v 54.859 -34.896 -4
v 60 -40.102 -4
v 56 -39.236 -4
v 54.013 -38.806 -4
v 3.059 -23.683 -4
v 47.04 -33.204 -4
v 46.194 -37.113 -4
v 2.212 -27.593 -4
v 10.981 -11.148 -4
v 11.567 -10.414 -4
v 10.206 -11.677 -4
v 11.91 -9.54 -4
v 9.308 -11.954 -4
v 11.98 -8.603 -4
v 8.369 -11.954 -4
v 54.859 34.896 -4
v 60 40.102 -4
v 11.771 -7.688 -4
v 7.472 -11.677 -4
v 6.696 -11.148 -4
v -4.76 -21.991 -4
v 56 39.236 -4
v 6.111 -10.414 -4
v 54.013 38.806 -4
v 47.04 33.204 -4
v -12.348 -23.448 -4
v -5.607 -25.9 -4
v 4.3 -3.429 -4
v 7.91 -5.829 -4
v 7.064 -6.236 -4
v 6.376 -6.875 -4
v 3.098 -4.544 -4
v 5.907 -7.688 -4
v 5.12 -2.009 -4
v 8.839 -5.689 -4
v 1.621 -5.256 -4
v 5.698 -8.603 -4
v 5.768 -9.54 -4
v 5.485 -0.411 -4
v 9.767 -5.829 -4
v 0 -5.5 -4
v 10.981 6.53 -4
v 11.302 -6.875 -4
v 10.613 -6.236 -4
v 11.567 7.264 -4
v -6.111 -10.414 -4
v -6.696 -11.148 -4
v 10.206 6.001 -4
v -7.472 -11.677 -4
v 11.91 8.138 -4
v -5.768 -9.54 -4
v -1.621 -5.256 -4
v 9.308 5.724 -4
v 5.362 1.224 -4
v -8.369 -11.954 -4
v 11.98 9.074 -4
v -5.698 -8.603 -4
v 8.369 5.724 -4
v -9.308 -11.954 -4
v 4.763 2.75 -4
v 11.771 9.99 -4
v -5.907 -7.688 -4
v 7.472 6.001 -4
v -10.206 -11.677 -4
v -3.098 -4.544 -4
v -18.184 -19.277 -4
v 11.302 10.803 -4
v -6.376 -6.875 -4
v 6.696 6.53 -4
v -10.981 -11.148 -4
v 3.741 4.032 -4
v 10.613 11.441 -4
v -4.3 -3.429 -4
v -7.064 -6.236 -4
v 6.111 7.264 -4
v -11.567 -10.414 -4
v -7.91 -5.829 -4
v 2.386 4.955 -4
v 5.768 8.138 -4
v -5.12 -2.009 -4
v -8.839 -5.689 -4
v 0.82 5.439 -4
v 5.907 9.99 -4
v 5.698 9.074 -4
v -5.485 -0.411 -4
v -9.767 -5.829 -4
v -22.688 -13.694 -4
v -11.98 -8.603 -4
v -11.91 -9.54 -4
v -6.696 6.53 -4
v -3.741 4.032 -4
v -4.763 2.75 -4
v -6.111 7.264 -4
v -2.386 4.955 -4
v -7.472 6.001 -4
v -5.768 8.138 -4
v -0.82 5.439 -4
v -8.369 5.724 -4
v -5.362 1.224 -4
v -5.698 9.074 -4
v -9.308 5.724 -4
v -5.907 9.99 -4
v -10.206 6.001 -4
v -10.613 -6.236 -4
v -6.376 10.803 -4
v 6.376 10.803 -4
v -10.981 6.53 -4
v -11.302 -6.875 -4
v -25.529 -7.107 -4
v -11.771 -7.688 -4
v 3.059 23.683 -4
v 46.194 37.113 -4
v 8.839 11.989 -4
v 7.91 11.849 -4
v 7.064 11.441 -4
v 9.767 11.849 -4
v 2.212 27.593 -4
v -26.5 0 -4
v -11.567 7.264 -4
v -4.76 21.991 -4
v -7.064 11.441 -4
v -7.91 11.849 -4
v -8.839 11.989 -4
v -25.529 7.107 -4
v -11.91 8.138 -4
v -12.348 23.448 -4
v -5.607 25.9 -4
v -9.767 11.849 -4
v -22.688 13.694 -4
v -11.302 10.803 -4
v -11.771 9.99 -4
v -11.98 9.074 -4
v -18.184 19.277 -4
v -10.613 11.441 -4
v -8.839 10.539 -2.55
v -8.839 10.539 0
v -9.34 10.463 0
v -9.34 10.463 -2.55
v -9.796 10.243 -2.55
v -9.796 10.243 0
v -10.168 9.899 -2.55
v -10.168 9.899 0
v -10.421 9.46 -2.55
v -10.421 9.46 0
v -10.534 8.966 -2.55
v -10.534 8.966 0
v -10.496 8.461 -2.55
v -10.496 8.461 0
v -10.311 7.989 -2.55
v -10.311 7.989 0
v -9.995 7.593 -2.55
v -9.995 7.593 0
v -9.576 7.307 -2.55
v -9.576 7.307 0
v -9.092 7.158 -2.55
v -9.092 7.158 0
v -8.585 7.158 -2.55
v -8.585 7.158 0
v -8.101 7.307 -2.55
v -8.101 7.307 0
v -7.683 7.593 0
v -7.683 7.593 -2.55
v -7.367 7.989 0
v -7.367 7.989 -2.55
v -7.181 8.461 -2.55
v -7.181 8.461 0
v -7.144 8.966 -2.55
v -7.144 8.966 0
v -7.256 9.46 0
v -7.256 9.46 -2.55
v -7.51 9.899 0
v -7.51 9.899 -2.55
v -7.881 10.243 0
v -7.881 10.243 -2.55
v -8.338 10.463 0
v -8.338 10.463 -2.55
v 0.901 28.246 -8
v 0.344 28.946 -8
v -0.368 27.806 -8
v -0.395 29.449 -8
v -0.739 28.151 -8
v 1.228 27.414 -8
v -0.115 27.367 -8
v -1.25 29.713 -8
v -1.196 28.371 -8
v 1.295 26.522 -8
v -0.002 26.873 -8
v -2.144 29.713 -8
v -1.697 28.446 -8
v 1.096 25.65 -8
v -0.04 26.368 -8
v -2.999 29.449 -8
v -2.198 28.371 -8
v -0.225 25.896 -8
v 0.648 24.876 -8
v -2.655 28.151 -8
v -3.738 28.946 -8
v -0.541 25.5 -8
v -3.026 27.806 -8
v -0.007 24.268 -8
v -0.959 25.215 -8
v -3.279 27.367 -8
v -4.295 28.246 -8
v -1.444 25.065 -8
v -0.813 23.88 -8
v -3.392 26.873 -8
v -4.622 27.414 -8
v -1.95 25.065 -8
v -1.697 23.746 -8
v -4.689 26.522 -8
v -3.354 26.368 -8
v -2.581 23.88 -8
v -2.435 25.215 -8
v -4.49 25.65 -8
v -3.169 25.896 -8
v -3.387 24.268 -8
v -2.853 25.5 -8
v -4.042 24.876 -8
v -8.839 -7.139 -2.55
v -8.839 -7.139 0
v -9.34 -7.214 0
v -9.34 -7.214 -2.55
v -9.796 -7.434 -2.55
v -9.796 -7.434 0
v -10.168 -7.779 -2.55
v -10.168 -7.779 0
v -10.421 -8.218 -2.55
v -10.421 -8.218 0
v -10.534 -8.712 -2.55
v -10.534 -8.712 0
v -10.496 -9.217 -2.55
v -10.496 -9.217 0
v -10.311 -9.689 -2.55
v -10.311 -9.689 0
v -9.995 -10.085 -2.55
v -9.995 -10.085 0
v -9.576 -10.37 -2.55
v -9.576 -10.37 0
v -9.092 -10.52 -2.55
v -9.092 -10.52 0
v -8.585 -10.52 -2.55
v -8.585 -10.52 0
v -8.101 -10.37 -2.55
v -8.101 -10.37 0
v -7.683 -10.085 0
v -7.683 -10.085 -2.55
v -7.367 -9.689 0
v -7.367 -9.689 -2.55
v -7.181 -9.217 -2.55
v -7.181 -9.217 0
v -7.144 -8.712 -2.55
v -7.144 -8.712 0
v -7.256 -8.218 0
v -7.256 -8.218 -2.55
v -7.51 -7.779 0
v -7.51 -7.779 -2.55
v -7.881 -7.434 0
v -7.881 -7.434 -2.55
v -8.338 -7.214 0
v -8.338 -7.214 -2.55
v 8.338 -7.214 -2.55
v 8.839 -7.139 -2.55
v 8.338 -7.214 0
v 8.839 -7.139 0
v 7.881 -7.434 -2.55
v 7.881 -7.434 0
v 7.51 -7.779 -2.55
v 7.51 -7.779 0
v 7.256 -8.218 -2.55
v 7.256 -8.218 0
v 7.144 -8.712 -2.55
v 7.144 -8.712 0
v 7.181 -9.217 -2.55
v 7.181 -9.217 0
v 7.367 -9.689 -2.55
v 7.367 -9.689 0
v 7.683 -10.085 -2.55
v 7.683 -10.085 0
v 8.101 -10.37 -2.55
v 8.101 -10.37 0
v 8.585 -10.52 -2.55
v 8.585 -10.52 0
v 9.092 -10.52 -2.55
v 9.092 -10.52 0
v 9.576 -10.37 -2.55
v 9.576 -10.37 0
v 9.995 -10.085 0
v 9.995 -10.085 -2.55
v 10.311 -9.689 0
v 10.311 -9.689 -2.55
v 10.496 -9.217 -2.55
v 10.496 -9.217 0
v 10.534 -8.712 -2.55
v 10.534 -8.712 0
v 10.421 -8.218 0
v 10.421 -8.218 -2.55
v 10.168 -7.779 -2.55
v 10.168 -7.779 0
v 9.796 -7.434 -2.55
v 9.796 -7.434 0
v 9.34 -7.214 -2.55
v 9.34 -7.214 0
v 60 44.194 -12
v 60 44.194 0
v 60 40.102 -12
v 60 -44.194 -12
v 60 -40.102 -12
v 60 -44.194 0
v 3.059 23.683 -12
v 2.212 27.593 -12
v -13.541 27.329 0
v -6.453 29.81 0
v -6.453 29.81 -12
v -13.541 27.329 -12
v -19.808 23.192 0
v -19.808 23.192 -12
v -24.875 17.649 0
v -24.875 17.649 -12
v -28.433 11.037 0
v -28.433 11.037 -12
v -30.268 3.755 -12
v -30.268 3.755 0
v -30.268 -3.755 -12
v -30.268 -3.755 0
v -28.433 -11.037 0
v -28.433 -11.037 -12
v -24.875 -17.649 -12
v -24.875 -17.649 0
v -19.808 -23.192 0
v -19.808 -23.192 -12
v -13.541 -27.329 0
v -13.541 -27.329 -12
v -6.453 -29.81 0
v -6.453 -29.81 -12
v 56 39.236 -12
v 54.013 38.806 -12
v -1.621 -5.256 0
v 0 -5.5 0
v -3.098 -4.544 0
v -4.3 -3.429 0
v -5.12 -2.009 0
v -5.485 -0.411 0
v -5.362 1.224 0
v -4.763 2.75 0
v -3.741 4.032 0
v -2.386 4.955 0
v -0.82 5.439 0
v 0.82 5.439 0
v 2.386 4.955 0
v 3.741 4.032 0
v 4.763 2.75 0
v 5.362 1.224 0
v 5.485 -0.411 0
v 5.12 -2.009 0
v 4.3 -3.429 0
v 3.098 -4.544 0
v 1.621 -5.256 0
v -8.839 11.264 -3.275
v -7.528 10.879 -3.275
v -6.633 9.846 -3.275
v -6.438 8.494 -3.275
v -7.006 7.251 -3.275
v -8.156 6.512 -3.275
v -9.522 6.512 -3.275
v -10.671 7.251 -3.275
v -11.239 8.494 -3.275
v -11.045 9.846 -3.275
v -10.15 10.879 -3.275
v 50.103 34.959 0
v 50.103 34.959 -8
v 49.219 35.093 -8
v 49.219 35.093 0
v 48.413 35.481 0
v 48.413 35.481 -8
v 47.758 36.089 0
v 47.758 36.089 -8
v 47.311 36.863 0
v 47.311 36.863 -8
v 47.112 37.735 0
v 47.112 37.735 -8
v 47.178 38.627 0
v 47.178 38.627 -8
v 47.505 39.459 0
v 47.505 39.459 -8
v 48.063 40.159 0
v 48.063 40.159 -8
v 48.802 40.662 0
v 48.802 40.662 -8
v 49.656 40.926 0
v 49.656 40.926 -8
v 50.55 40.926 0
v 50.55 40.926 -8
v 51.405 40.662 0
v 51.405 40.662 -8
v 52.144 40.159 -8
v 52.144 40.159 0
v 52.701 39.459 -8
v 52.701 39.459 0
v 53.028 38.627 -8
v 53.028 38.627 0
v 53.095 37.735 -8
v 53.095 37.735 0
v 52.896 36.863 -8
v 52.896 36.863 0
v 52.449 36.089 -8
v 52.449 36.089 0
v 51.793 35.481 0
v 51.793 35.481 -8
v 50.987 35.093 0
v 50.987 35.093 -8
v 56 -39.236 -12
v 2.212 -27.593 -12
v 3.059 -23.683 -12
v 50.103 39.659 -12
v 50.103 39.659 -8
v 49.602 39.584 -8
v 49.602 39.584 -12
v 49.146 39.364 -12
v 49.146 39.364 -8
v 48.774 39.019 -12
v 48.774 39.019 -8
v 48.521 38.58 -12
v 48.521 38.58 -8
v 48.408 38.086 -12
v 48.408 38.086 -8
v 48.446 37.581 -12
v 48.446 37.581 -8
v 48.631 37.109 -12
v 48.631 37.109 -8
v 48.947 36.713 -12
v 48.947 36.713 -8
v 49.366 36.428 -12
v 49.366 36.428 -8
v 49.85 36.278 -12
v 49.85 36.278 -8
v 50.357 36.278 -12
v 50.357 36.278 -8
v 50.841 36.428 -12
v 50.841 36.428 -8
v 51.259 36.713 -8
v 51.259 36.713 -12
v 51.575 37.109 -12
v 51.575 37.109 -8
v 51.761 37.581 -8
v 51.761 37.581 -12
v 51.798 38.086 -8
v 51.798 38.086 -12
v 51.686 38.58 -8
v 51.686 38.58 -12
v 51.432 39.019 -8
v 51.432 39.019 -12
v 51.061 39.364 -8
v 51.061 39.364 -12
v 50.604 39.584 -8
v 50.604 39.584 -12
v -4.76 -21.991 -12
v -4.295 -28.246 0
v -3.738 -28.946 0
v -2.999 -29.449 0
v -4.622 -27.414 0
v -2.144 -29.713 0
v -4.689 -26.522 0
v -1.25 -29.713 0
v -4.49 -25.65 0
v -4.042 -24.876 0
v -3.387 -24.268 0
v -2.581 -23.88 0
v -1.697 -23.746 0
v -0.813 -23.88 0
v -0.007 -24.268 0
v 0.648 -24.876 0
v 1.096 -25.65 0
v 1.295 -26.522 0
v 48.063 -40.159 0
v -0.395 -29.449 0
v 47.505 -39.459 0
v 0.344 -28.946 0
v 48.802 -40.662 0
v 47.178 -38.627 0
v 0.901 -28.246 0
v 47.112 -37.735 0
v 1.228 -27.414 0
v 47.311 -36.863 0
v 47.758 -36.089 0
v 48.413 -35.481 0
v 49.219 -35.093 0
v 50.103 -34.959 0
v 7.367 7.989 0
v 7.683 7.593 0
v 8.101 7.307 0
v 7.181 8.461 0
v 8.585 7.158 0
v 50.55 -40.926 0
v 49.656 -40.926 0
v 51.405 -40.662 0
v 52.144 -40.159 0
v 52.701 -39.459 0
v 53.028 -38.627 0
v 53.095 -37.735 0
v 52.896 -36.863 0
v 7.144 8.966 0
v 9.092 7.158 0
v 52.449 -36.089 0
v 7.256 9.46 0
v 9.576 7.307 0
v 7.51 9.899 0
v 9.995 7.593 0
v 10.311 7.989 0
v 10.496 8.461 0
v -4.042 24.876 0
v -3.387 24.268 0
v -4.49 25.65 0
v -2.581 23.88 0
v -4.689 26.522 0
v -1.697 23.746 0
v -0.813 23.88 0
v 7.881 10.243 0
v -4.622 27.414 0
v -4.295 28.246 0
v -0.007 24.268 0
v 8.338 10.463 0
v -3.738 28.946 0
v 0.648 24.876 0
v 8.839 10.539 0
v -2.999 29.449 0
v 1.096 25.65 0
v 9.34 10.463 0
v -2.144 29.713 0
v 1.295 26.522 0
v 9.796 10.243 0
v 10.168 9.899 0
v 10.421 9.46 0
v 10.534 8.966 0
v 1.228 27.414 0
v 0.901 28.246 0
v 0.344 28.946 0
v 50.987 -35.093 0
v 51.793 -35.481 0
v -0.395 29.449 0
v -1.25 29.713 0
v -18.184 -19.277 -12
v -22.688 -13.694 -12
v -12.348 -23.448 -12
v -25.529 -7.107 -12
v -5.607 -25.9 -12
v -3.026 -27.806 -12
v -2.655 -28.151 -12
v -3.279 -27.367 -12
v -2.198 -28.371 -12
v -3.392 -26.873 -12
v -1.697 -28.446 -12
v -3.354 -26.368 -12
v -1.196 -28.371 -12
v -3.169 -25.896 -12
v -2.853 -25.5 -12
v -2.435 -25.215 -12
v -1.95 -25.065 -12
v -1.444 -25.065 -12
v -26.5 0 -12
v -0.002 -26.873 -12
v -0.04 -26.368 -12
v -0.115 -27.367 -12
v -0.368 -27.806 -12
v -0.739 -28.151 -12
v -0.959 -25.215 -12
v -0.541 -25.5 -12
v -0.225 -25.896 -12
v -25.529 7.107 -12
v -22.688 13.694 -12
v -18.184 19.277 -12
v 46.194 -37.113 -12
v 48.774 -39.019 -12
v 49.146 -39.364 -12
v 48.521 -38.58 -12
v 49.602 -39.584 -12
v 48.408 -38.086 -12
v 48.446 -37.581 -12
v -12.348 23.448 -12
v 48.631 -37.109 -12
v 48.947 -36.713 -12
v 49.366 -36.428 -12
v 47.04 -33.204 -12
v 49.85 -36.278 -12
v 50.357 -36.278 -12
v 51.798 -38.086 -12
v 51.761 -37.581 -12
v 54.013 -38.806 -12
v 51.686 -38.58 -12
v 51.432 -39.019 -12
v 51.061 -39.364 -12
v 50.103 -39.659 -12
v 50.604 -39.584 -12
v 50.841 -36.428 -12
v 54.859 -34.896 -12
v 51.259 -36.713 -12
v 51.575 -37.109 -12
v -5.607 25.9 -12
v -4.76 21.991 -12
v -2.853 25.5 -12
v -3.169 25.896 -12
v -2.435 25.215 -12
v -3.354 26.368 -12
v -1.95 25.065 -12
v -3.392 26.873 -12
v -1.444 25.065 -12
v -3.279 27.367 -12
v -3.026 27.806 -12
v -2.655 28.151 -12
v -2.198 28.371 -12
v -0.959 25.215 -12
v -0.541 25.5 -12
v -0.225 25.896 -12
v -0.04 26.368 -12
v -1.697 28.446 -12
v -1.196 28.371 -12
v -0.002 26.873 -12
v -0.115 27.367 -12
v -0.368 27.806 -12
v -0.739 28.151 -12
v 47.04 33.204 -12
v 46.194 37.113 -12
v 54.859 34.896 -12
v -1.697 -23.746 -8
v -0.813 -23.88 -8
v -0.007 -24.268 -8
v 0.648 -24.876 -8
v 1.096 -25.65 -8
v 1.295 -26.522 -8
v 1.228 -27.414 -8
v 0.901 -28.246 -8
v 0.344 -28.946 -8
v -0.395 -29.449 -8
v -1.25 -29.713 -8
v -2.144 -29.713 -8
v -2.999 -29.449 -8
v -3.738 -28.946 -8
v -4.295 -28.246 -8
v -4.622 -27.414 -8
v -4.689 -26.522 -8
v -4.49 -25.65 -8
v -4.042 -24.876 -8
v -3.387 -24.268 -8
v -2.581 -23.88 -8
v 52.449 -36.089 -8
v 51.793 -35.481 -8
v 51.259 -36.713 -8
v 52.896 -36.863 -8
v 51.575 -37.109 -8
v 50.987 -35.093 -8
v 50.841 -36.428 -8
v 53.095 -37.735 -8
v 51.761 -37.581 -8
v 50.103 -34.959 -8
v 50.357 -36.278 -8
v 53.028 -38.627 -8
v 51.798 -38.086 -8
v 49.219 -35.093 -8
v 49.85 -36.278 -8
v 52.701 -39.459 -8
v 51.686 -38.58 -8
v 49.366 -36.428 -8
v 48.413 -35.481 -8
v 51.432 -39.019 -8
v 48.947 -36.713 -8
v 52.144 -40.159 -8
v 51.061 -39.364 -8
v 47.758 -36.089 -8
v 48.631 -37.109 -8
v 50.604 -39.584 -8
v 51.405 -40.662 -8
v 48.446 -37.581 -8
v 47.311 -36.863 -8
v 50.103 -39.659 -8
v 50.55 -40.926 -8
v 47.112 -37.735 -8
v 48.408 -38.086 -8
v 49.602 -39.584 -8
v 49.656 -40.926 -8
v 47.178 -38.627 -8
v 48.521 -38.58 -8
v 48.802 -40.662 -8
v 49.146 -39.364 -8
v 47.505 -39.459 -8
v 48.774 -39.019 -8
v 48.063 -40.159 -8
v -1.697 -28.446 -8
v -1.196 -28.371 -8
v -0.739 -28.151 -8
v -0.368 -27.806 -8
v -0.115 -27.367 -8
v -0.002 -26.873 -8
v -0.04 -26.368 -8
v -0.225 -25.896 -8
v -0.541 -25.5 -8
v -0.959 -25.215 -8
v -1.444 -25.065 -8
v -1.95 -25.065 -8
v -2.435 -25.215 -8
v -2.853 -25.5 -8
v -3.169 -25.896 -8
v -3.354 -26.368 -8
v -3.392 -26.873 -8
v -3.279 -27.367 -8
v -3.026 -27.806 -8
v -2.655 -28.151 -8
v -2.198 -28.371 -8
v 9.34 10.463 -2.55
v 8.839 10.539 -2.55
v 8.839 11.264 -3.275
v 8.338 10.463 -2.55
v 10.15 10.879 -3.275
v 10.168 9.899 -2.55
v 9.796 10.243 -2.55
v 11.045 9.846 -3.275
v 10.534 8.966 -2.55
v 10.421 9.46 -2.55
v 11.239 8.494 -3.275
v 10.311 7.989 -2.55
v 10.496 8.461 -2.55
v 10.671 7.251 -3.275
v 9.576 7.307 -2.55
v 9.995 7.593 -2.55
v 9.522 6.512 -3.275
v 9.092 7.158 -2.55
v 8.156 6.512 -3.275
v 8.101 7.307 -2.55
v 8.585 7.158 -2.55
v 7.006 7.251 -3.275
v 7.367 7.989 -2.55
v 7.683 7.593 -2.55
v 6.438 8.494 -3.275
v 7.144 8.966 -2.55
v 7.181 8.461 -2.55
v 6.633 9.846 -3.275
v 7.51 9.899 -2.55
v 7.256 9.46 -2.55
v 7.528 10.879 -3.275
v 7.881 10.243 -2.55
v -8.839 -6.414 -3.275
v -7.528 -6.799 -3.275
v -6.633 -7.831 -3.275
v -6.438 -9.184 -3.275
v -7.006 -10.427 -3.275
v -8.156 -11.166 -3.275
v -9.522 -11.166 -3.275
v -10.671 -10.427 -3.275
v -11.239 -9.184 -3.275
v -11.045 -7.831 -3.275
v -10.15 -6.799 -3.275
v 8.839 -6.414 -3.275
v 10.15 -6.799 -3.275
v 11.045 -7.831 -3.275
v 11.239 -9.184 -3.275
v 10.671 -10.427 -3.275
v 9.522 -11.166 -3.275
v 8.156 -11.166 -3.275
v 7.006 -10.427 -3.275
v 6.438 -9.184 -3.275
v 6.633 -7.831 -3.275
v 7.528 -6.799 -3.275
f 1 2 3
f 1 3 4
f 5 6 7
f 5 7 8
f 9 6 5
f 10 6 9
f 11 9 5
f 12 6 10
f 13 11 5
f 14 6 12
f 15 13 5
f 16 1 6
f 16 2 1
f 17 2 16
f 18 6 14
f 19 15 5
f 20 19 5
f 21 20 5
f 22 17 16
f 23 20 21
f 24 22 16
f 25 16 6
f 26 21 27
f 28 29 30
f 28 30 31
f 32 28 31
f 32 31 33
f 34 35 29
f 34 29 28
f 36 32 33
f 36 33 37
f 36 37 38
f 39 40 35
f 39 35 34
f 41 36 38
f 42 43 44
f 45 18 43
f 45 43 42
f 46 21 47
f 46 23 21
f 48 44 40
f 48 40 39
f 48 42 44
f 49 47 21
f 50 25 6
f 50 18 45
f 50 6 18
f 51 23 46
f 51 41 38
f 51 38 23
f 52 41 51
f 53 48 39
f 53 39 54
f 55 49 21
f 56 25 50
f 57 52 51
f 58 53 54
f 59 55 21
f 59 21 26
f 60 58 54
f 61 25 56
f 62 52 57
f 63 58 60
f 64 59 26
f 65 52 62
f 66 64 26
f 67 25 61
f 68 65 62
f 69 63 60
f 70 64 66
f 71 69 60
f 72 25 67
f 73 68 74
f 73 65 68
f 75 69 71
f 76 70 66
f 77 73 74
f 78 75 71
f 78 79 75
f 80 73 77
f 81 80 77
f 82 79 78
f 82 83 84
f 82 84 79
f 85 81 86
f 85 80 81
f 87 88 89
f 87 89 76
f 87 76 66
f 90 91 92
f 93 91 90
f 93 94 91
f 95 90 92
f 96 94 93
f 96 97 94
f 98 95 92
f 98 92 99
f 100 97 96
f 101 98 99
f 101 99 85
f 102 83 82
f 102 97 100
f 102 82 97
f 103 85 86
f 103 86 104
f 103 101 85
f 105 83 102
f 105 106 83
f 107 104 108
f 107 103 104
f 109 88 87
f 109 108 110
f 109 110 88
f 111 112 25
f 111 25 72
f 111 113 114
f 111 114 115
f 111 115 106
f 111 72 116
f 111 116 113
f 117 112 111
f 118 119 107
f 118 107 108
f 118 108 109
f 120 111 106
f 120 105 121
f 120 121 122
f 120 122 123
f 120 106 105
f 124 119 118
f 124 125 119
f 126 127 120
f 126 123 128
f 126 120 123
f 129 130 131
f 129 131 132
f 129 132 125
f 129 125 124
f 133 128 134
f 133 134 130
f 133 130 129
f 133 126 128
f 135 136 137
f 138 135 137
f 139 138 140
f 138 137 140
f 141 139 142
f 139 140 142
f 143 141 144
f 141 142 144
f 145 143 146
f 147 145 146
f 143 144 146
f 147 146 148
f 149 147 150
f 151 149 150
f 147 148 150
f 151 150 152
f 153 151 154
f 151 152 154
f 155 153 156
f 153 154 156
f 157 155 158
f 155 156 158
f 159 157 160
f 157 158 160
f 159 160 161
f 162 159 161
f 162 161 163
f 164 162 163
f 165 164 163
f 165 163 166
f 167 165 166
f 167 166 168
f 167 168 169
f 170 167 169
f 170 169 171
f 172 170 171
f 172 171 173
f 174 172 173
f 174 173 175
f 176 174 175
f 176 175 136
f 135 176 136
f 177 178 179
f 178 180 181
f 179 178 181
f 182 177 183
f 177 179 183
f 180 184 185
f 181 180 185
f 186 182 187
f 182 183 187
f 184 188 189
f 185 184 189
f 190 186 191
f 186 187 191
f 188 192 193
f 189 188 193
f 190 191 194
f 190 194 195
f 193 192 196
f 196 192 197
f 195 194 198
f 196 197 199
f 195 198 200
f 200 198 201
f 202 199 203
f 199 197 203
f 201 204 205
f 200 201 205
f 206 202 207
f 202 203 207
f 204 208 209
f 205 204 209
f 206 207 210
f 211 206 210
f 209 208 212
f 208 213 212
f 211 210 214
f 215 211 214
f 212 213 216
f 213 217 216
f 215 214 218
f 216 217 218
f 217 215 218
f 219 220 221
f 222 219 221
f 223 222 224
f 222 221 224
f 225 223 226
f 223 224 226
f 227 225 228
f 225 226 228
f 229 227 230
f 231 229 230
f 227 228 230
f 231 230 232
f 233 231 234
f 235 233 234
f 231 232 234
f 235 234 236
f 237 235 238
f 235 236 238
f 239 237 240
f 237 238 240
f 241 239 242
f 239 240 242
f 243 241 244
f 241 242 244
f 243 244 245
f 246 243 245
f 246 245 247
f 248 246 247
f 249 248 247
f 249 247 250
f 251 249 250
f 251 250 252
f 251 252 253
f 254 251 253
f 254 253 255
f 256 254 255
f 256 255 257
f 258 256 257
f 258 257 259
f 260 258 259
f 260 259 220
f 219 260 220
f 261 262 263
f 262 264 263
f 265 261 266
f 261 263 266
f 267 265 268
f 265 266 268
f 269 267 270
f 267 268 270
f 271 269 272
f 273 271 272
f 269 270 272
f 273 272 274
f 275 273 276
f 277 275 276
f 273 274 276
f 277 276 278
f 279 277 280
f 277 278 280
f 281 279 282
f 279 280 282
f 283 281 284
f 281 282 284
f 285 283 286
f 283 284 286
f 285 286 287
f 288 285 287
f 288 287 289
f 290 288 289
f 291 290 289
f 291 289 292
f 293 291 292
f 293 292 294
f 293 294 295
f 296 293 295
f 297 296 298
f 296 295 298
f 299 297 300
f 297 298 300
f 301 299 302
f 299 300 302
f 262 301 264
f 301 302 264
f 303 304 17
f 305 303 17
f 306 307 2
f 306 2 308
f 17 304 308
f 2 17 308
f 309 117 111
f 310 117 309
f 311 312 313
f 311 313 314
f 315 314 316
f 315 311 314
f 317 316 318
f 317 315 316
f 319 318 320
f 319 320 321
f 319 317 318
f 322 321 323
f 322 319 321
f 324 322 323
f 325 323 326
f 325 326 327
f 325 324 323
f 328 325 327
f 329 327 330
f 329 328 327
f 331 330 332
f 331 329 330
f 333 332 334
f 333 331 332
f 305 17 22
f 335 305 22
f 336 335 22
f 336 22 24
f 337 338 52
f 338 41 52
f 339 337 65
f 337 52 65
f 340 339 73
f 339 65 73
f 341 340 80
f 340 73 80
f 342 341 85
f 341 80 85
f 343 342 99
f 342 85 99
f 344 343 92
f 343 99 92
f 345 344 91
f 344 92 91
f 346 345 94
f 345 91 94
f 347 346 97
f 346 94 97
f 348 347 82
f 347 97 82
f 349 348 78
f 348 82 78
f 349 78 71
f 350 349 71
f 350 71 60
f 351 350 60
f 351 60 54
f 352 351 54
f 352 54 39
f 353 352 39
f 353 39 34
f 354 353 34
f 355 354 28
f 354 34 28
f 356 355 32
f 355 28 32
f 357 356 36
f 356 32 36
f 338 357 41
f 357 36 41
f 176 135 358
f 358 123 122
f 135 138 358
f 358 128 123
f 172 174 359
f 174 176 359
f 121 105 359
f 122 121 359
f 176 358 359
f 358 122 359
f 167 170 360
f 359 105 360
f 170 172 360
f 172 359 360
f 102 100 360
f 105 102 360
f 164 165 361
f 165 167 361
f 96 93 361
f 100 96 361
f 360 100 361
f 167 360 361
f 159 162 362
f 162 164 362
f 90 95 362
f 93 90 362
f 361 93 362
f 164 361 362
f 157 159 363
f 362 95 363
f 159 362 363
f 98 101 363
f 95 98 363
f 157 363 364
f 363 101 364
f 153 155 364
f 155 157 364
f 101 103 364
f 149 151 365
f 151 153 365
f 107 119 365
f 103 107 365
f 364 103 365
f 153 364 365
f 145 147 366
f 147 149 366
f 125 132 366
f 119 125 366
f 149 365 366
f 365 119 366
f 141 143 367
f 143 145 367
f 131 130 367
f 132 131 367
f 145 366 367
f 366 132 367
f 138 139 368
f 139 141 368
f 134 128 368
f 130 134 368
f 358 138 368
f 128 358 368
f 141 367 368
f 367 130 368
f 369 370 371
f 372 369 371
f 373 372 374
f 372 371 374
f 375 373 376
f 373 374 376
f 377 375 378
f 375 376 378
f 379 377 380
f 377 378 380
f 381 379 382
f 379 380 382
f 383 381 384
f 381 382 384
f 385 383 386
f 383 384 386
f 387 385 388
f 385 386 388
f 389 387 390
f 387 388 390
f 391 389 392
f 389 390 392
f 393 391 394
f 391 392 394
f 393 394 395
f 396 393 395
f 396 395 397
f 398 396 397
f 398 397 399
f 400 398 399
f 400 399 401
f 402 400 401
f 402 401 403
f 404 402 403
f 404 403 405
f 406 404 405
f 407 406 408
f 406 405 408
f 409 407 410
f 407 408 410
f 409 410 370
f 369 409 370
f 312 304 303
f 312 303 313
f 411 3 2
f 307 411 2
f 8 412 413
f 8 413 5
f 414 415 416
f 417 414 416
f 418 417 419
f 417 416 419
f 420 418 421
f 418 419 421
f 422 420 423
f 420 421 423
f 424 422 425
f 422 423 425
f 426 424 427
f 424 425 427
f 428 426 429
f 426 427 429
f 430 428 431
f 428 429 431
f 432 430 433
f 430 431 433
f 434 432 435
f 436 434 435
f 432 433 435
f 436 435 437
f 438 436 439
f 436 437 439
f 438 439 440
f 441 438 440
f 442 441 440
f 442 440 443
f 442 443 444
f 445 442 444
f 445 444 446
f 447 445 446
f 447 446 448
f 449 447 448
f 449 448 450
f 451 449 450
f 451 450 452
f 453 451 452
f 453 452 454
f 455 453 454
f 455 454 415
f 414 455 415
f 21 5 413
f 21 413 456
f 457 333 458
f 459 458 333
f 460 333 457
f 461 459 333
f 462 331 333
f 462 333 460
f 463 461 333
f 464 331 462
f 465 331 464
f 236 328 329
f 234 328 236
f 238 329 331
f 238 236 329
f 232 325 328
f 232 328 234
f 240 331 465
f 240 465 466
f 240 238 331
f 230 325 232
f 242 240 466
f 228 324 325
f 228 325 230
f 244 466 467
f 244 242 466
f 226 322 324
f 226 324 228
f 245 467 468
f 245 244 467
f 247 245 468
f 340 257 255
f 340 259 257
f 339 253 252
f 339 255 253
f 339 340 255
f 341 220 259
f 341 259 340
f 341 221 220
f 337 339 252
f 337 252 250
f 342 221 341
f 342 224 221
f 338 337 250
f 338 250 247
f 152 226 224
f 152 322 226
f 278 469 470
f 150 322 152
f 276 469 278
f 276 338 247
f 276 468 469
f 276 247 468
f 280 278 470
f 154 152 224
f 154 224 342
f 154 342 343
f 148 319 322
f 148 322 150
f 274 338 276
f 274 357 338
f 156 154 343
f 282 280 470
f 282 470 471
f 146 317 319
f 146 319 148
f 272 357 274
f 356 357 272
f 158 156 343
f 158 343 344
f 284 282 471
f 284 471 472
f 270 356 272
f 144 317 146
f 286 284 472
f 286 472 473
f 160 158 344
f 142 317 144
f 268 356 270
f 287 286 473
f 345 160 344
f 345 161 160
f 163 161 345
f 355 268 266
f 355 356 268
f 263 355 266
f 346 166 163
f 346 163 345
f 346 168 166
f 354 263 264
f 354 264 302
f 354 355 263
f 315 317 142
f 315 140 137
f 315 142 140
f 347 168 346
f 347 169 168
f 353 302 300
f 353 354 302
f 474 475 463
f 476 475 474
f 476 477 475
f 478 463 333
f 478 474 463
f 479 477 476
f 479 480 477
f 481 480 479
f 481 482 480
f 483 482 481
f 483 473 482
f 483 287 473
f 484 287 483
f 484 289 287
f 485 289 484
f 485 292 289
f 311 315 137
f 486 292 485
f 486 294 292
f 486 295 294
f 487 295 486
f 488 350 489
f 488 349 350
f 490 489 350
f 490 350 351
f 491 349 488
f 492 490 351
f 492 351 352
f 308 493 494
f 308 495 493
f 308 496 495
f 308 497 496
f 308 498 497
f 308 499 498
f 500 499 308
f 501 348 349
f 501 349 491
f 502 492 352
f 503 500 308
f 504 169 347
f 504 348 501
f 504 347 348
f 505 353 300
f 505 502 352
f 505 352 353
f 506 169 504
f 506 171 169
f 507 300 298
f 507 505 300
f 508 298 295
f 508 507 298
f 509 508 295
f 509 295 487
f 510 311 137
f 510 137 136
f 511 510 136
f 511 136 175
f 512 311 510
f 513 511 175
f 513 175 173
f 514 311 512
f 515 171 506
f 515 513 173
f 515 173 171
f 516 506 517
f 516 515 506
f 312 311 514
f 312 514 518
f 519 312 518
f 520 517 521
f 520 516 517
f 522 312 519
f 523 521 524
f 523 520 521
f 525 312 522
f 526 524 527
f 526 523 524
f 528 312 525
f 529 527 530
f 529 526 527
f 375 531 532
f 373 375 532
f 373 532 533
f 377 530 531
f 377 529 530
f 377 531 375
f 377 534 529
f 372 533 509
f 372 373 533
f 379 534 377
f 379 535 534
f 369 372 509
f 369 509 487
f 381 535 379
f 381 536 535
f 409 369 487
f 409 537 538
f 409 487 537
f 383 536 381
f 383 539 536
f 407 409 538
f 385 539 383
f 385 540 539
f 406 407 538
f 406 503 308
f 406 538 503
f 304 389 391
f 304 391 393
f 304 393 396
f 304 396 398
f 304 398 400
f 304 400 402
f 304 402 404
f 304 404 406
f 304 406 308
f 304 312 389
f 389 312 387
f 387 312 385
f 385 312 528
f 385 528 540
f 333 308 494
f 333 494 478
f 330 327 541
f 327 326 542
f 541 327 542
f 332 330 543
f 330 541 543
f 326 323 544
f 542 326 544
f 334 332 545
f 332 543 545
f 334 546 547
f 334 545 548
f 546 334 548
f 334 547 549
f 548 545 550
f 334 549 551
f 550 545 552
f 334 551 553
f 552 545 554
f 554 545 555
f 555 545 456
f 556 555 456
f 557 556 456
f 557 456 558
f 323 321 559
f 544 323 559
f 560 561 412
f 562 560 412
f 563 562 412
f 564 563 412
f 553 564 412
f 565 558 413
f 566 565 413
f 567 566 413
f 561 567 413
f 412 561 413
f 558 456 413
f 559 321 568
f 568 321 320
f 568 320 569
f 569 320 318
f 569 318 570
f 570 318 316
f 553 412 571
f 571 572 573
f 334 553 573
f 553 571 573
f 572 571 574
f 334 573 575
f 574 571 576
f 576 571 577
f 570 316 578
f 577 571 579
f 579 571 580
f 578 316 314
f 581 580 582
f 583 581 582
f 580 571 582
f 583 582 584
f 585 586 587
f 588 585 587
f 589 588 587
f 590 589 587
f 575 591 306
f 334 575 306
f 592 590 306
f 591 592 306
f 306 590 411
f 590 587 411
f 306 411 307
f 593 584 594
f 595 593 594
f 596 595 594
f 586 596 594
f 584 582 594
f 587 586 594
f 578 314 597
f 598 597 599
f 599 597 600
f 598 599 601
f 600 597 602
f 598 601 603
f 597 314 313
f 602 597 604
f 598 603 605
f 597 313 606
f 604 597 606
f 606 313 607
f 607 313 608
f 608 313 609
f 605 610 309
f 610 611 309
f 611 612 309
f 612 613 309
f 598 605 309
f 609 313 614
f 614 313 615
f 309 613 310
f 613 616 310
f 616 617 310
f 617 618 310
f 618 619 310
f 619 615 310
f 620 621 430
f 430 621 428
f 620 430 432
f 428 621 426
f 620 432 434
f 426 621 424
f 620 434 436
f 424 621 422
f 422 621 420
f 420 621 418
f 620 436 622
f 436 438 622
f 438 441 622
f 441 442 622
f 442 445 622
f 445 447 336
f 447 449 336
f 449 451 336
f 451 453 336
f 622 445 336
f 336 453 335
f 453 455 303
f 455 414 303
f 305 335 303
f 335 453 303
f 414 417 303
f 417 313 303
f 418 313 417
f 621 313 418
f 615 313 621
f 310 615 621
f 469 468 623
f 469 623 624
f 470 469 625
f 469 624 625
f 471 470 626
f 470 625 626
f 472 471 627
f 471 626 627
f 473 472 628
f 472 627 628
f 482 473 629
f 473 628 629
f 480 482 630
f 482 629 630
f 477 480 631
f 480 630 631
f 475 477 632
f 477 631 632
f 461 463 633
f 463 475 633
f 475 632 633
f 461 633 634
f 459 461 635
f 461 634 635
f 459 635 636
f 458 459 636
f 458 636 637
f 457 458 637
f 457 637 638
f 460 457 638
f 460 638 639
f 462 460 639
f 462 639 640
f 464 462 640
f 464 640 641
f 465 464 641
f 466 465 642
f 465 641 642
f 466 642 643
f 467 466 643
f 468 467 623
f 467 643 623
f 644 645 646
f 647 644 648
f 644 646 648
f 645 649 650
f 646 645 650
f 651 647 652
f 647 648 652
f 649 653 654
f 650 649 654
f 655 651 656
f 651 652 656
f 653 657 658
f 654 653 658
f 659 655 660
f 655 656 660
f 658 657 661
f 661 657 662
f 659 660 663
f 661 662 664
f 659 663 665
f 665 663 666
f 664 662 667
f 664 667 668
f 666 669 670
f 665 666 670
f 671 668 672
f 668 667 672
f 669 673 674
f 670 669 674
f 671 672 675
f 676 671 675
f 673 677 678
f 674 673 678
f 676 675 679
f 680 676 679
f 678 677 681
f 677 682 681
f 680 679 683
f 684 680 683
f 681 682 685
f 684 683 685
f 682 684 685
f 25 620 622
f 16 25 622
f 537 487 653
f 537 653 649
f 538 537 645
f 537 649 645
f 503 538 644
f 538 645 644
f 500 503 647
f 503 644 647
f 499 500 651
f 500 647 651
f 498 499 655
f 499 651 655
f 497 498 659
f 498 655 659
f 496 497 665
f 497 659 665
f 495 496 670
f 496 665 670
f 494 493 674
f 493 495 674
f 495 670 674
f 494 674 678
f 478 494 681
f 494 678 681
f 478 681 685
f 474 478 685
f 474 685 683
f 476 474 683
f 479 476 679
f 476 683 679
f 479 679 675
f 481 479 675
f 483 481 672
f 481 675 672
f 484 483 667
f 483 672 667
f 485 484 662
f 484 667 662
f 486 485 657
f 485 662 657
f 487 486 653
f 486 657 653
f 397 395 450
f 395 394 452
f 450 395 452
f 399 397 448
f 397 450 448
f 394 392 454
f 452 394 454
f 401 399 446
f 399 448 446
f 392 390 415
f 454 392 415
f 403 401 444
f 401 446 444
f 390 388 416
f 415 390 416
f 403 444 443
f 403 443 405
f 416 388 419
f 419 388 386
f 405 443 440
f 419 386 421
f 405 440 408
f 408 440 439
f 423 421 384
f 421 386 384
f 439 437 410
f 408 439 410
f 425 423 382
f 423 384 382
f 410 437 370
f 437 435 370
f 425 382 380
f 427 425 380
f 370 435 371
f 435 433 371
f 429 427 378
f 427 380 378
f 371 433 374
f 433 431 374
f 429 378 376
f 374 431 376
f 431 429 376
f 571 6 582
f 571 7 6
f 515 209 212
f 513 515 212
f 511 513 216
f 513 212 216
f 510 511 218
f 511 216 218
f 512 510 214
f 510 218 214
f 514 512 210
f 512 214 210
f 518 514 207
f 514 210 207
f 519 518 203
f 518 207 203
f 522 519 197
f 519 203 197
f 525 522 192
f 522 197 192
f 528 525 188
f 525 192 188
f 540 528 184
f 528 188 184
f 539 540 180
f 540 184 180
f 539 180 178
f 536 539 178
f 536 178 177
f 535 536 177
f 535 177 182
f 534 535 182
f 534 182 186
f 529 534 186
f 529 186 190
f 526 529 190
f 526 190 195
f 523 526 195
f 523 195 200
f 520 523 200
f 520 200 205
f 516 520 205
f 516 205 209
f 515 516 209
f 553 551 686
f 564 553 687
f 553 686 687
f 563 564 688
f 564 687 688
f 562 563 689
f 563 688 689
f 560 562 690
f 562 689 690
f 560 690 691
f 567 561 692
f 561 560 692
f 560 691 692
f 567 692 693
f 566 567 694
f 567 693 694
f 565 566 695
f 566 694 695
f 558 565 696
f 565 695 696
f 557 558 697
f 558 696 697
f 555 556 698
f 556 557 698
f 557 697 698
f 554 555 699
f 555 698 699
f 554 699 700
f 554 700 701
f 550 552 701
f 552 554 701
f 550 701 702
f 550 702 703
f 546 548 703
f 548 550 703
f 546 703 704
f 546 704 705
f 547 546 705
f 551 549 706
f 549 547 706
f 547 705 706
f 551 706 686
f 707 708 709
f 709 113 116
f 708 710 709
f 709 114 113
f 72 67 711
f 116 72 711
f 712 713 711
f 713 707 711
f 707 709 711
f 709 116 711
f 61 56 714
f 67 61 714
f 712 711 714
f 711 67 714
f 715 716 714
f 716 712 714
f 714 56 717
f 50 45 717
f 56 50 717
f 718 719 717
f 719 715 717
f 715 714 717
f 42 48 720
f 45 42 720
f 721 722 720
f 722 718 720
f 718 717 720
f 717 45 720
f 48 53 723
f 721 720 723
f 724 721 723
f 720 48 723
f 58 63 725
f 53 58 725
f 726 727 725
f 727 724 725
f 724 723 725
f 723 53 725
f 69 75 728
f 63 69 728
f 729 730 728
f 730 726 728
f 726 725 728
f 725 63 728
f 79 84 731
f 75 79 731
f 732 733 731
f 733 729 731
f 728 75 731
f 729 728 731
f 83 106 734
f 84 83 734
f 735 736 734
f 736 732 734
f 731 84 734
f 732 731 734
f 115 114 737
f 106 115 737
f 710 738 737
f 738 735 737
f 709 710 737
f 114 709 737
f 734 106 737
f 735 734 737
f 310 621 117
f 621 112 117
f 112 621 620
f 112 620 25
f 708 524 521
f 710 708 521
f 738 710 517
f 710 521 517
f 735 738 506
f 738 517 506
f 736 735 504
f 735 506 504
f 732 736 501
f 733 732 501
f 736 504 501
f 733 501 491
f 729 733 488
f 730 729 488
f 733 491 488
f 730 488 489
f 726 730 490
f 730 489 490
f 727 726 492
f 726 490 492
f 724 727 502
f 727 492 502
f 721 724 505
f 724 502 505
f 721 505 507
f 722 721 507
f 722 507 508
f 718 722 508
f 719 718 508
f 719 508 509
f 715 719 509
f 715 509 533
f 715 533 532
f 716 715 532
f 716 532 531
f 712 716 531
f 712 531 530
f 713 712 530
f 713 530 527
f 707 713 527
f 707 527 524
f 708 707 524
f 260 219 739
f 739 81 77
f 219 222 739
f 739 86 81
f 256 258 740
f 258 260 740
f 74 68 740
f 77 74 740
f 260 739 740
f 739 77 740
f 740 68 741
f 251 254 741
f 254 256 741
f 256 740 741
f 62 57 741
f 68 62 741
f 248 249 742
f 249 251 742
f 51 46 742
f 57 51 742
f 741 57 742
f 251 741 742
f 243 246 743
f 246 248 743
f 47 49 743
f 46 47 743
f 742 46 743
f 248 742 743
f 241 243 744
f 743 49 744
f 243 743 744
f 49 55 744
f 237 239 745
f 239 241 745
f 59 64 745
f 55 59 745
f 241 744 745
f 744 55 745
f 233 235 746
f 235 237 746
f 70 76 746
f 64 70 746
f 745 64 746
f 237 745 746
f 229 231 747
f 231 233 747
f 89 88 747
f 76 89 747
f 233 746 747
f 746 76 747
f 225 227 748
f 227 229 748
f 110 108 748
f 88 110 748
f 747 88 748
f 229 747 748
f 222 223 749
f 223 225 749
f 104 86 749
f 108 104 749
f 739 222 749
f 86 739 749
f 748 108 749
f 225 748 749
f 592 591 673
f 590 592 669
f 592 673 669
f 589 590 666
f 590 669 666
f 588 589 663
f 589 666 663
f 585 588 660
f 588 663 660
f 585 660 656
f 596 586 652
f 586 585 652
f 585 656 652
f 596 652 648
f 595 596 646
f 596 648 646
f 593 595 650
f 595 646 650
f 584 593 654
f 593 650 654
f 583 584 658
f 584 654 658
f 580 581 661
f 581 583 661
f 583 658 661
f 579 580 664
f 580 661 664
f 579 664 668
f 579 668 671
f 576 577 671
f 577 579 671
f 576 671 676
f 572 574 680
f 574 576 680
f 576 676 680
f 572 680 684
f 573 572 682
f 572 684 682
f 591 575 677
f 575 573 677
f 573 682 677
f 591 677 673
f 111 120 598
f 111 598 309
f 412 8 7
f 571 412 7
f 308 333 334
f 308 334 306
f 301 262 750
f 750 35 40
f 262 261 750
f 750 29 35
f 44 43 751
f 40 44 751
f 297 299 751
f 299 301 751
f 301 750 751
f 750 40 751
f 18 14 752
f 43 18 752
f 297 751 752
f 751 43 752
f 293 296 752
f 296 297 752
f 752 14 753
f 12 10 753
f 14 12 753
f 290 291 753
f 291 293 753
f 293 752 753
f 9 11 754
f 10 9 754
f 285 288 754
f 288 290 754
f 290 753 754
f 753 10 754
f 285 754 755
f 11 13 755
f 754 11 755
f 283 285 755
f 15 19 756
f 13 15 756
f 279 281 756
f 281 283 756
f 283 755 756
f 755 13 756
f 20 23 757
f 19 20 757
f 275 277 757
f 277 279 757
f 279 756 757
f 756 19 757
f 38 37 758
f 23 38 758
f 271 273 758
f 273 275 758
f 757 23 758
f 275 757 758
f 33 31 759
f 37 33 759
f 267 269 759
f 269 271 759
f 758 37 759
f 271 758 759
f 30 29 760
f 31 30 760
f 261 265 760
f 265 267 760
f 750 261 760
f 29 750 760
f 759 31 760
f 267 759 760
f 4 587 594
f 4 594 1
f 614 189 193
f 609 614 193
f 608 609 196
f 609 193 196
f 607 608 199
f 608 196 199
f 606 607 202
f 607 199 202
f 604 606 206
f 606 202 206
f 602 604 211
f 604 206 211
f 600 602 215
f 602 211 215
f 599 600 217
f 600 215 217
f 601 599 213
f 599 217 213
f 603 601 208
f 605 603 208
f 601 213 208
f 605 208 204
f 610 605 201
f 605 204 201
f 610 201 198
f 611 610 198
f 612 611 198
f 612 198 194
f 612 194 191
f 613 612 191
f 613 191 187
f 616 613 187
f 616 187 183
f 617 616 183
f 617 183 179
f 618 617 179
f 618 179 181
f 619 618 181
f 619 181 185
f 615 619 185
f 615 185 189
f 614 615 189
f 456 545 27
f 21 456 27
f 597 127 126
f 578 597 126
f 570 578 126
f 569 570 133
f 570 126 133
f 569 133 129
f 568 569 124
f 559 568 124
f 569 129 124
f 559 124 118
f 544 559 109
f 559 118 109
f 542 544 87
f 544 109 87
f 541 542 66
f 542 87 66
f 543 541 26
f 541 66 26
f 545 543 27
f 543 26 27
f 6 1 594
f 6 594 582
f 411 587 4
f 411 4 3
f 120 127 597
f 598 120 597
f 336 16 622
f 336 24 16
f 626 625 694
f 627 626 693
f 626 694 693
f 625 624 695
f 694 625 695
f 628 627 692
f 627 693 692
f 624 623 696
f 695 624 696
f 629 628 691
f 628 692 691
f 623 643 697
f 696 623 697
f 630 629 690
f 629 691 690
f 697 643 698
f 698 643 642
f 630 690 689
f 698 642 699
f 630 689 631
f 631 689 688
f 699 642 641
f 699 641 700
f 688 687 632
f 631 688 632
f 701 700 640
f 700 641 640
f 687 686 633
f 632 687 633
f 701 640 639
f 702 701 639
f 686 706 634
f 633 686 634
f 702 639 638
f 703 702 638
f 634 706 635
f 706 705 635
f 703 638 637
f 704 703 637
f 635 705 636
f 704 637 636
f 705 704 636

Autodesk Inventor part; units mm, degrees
ref_plane "YZ Plane" through (0, 0, 0) normal (1, 0, 0) x (0, 1, 0)
ref_plane "XZ Plane" through (0, 0, 0) normal (0, 1, 0) x (-1, 0, 0)
ref_plane "XY Plane" through (0, 0, 0) normal (0, 0, 1) x (1, 0, 0)
sketch "Sketch1" plane through (0, 0, 0) normal (0, 0, 1) x (1, 0, 0)
  circle A0 centre (0, 0) radius 30.5
  circle A1 centre (141.8, 0) radius 60.5
  line L0 (129.0003, 59.1305) -> (-6.4528, 29.8096)
  line L1 (-6.4528, -29.8096) -> (129.0003, -59.1305)
  line L2 (60, 44.1943) -> (60, -44.1943)
  dimension "d0" = 61
  dimension "d1" = 121
  dimension "d2" = 141.8
  dimension "d3" = 60
extrude "Extrusion1" add sketch "Sketch1" against normal blind 12 contours A0 | A0 L0 L2 L1
shell "Shell1" thickness 4 removed faces 1 at (37.8491, -9.9365, -12)
sketch "Sketch6" plane through (0, 0, 0) normal (0, 0, 1) x (1, 0, 0)
  point P0 (0, 0)
  point P1 (0, 0)
hole "Hole3" at (0, 0, 0) direction (0, 0, -1) diameter 11 end through all
sketch "Sketch5" plane through (56, -39.2358, -4) normal (0, 0, -1) x (-1, 0, 0)
  line L0 (64.8388, 48.0747) -> (47.1612, 48.0747)
  line L1 (47.1612, 48.0747) -> (47.1612, 30.397)
  line L2 (47.1612, 30.397) -> (64.8388, 30.397)
  line L3 (64.8388, 30.397) -> (64.8388, 48.0747)
  line L4 (64.8388, 48.0747) -> (47.1612, 30.397) construction
  line L5 (47.1612, 48.0747) -> (64.8388, 30.397) construction
  point P0 (56, 39.2358)
  dimension "d16" = 25
hole "Hole2" at (8.8388, -8.8388, -4) at (-8.8388, -8.8388, -4) at (-8.8388, 8.8388, -4) at (8.8388, 8.8388, -4) direction (0, 0, 1) diameter 3.4 end through all countersink diameter 6.3 countersink angle 90 clearance for "Countersunk Flat Head Screw ISO 2009/7046" size "M3" standard "ISO"
sketch "Sketch7" plane through (56, -39.2358, -4) normal (0, 0, -1) x (-1, 0, 0)
  line L0 (26.9325, 5.83) -> (-25.6804, -5.5589)
  line L1 (-25.6804, -5.5589) -> (-25.6804, 84.0306)
  line L2 (-25.6804, 84.0306) -> (28.864, 72.2236)
  line L3 (28.864, 72.2236) -> (24.7276, 5.3527)
  line L4 (61.6065, 13.3357) -> (0, 0) projected
  line L5 (0, 78.4716) -> (61.6065, 65.136) projected
  point P0 (56, 39.2358)
extrude "Extrusion2" cut sketch "Sketch7" along normal through all
sketch "Sketch8" plane through (-5.6065, 25.9001, -12) normal (0.2115656, -0.9773638, 0) x (0.9773638, 0.2115656, 0)
  line L0 (0, 8) -> (0, 0) projected
  line L1 (67.126, 0) -> (0, 0) projected
  line L2 (0, 8) -> (8, 8)
  line L3 (8, 8) -> (8, 0)
  line L4 (8, 0) -> (0, 0)
  line L5 (0, 0) -> (0, 8)
  line L6 (53, 8) -> (61, 8)
  line L7 (61, 8) -> (61, 0)
  line L8 (61, 0) -> (53, 0)
  line L9 (53, 0) -> (53, 8)
  point P0 (0, 12)
  dimension "d33" = 8
  dimension "d34" = 8
  dimension "d35" = 45
extrude "Extrusion3" add sketch "Sketch8" along normal blind 4
sketch "Sketch9" plane through (0, 0, -12) normal (0, 0, -1) x (-1, 0, 0)
  line L0 (4.7602, 21.9907) -> (-3.0587, 23.6832) projected
  line L1 (-60, 44.1943) -> (6.4528, 29.8096) projected
  line L2 (-46.1938, 37.1131) -> (-47.0401, 33.2037) projected
  line L3 (-47.0401, 33.2037) -> (-53.1727, 42.6863)
  line L4 (-1.3662, 31.5021) -> (4.7602, 21.9907)
  line L5 (-3.0587, 23.6832) -> (6.4528, 29.8096)
  line L6 (-47.0401, 33.2037) -> (-54.859, 34.8962) projected
  line L7 (-54.859, 34.8962) -> (-45.3475, 41.0226)
  point P0 (0, 0)
  point P1 (-50.1032, 37.9594)
  point P2 (1.697, 26.7464)
hole "Hole4" at (50.1032, 37.9594, -12) at (-1.697, 26.7464, -12) direction (0, 0, 1) diameter 3.4 end through all clearance for "Countersunk Flat Head Screw ISO 2009/7046" size "M3" standard "ISO"
sketch "Sketch10" plane through (0, 0, 0) normal (0, 0, 1) x (1, 0, 0)
  circle A0 centre (50.1032, 37.9594) radius 1.7 projected
  circle A1 centre (-1.697, 26.7464) radius 1.7 projected
  point P0 (0, 0)
hole "Hole5" at (50.1032, 37.9594, 0) at (-1.697, 26.7464, 0) direction (0, 0, -1) diameter 6 depth 8
mirror "Mirror1" about plane through (0, 0, 0) normal (0, 1, 0) of "Extrusion3", "Hole4", "Hole5"
equation "\"d34\" = d33"
properties part number "J1-sketch"
